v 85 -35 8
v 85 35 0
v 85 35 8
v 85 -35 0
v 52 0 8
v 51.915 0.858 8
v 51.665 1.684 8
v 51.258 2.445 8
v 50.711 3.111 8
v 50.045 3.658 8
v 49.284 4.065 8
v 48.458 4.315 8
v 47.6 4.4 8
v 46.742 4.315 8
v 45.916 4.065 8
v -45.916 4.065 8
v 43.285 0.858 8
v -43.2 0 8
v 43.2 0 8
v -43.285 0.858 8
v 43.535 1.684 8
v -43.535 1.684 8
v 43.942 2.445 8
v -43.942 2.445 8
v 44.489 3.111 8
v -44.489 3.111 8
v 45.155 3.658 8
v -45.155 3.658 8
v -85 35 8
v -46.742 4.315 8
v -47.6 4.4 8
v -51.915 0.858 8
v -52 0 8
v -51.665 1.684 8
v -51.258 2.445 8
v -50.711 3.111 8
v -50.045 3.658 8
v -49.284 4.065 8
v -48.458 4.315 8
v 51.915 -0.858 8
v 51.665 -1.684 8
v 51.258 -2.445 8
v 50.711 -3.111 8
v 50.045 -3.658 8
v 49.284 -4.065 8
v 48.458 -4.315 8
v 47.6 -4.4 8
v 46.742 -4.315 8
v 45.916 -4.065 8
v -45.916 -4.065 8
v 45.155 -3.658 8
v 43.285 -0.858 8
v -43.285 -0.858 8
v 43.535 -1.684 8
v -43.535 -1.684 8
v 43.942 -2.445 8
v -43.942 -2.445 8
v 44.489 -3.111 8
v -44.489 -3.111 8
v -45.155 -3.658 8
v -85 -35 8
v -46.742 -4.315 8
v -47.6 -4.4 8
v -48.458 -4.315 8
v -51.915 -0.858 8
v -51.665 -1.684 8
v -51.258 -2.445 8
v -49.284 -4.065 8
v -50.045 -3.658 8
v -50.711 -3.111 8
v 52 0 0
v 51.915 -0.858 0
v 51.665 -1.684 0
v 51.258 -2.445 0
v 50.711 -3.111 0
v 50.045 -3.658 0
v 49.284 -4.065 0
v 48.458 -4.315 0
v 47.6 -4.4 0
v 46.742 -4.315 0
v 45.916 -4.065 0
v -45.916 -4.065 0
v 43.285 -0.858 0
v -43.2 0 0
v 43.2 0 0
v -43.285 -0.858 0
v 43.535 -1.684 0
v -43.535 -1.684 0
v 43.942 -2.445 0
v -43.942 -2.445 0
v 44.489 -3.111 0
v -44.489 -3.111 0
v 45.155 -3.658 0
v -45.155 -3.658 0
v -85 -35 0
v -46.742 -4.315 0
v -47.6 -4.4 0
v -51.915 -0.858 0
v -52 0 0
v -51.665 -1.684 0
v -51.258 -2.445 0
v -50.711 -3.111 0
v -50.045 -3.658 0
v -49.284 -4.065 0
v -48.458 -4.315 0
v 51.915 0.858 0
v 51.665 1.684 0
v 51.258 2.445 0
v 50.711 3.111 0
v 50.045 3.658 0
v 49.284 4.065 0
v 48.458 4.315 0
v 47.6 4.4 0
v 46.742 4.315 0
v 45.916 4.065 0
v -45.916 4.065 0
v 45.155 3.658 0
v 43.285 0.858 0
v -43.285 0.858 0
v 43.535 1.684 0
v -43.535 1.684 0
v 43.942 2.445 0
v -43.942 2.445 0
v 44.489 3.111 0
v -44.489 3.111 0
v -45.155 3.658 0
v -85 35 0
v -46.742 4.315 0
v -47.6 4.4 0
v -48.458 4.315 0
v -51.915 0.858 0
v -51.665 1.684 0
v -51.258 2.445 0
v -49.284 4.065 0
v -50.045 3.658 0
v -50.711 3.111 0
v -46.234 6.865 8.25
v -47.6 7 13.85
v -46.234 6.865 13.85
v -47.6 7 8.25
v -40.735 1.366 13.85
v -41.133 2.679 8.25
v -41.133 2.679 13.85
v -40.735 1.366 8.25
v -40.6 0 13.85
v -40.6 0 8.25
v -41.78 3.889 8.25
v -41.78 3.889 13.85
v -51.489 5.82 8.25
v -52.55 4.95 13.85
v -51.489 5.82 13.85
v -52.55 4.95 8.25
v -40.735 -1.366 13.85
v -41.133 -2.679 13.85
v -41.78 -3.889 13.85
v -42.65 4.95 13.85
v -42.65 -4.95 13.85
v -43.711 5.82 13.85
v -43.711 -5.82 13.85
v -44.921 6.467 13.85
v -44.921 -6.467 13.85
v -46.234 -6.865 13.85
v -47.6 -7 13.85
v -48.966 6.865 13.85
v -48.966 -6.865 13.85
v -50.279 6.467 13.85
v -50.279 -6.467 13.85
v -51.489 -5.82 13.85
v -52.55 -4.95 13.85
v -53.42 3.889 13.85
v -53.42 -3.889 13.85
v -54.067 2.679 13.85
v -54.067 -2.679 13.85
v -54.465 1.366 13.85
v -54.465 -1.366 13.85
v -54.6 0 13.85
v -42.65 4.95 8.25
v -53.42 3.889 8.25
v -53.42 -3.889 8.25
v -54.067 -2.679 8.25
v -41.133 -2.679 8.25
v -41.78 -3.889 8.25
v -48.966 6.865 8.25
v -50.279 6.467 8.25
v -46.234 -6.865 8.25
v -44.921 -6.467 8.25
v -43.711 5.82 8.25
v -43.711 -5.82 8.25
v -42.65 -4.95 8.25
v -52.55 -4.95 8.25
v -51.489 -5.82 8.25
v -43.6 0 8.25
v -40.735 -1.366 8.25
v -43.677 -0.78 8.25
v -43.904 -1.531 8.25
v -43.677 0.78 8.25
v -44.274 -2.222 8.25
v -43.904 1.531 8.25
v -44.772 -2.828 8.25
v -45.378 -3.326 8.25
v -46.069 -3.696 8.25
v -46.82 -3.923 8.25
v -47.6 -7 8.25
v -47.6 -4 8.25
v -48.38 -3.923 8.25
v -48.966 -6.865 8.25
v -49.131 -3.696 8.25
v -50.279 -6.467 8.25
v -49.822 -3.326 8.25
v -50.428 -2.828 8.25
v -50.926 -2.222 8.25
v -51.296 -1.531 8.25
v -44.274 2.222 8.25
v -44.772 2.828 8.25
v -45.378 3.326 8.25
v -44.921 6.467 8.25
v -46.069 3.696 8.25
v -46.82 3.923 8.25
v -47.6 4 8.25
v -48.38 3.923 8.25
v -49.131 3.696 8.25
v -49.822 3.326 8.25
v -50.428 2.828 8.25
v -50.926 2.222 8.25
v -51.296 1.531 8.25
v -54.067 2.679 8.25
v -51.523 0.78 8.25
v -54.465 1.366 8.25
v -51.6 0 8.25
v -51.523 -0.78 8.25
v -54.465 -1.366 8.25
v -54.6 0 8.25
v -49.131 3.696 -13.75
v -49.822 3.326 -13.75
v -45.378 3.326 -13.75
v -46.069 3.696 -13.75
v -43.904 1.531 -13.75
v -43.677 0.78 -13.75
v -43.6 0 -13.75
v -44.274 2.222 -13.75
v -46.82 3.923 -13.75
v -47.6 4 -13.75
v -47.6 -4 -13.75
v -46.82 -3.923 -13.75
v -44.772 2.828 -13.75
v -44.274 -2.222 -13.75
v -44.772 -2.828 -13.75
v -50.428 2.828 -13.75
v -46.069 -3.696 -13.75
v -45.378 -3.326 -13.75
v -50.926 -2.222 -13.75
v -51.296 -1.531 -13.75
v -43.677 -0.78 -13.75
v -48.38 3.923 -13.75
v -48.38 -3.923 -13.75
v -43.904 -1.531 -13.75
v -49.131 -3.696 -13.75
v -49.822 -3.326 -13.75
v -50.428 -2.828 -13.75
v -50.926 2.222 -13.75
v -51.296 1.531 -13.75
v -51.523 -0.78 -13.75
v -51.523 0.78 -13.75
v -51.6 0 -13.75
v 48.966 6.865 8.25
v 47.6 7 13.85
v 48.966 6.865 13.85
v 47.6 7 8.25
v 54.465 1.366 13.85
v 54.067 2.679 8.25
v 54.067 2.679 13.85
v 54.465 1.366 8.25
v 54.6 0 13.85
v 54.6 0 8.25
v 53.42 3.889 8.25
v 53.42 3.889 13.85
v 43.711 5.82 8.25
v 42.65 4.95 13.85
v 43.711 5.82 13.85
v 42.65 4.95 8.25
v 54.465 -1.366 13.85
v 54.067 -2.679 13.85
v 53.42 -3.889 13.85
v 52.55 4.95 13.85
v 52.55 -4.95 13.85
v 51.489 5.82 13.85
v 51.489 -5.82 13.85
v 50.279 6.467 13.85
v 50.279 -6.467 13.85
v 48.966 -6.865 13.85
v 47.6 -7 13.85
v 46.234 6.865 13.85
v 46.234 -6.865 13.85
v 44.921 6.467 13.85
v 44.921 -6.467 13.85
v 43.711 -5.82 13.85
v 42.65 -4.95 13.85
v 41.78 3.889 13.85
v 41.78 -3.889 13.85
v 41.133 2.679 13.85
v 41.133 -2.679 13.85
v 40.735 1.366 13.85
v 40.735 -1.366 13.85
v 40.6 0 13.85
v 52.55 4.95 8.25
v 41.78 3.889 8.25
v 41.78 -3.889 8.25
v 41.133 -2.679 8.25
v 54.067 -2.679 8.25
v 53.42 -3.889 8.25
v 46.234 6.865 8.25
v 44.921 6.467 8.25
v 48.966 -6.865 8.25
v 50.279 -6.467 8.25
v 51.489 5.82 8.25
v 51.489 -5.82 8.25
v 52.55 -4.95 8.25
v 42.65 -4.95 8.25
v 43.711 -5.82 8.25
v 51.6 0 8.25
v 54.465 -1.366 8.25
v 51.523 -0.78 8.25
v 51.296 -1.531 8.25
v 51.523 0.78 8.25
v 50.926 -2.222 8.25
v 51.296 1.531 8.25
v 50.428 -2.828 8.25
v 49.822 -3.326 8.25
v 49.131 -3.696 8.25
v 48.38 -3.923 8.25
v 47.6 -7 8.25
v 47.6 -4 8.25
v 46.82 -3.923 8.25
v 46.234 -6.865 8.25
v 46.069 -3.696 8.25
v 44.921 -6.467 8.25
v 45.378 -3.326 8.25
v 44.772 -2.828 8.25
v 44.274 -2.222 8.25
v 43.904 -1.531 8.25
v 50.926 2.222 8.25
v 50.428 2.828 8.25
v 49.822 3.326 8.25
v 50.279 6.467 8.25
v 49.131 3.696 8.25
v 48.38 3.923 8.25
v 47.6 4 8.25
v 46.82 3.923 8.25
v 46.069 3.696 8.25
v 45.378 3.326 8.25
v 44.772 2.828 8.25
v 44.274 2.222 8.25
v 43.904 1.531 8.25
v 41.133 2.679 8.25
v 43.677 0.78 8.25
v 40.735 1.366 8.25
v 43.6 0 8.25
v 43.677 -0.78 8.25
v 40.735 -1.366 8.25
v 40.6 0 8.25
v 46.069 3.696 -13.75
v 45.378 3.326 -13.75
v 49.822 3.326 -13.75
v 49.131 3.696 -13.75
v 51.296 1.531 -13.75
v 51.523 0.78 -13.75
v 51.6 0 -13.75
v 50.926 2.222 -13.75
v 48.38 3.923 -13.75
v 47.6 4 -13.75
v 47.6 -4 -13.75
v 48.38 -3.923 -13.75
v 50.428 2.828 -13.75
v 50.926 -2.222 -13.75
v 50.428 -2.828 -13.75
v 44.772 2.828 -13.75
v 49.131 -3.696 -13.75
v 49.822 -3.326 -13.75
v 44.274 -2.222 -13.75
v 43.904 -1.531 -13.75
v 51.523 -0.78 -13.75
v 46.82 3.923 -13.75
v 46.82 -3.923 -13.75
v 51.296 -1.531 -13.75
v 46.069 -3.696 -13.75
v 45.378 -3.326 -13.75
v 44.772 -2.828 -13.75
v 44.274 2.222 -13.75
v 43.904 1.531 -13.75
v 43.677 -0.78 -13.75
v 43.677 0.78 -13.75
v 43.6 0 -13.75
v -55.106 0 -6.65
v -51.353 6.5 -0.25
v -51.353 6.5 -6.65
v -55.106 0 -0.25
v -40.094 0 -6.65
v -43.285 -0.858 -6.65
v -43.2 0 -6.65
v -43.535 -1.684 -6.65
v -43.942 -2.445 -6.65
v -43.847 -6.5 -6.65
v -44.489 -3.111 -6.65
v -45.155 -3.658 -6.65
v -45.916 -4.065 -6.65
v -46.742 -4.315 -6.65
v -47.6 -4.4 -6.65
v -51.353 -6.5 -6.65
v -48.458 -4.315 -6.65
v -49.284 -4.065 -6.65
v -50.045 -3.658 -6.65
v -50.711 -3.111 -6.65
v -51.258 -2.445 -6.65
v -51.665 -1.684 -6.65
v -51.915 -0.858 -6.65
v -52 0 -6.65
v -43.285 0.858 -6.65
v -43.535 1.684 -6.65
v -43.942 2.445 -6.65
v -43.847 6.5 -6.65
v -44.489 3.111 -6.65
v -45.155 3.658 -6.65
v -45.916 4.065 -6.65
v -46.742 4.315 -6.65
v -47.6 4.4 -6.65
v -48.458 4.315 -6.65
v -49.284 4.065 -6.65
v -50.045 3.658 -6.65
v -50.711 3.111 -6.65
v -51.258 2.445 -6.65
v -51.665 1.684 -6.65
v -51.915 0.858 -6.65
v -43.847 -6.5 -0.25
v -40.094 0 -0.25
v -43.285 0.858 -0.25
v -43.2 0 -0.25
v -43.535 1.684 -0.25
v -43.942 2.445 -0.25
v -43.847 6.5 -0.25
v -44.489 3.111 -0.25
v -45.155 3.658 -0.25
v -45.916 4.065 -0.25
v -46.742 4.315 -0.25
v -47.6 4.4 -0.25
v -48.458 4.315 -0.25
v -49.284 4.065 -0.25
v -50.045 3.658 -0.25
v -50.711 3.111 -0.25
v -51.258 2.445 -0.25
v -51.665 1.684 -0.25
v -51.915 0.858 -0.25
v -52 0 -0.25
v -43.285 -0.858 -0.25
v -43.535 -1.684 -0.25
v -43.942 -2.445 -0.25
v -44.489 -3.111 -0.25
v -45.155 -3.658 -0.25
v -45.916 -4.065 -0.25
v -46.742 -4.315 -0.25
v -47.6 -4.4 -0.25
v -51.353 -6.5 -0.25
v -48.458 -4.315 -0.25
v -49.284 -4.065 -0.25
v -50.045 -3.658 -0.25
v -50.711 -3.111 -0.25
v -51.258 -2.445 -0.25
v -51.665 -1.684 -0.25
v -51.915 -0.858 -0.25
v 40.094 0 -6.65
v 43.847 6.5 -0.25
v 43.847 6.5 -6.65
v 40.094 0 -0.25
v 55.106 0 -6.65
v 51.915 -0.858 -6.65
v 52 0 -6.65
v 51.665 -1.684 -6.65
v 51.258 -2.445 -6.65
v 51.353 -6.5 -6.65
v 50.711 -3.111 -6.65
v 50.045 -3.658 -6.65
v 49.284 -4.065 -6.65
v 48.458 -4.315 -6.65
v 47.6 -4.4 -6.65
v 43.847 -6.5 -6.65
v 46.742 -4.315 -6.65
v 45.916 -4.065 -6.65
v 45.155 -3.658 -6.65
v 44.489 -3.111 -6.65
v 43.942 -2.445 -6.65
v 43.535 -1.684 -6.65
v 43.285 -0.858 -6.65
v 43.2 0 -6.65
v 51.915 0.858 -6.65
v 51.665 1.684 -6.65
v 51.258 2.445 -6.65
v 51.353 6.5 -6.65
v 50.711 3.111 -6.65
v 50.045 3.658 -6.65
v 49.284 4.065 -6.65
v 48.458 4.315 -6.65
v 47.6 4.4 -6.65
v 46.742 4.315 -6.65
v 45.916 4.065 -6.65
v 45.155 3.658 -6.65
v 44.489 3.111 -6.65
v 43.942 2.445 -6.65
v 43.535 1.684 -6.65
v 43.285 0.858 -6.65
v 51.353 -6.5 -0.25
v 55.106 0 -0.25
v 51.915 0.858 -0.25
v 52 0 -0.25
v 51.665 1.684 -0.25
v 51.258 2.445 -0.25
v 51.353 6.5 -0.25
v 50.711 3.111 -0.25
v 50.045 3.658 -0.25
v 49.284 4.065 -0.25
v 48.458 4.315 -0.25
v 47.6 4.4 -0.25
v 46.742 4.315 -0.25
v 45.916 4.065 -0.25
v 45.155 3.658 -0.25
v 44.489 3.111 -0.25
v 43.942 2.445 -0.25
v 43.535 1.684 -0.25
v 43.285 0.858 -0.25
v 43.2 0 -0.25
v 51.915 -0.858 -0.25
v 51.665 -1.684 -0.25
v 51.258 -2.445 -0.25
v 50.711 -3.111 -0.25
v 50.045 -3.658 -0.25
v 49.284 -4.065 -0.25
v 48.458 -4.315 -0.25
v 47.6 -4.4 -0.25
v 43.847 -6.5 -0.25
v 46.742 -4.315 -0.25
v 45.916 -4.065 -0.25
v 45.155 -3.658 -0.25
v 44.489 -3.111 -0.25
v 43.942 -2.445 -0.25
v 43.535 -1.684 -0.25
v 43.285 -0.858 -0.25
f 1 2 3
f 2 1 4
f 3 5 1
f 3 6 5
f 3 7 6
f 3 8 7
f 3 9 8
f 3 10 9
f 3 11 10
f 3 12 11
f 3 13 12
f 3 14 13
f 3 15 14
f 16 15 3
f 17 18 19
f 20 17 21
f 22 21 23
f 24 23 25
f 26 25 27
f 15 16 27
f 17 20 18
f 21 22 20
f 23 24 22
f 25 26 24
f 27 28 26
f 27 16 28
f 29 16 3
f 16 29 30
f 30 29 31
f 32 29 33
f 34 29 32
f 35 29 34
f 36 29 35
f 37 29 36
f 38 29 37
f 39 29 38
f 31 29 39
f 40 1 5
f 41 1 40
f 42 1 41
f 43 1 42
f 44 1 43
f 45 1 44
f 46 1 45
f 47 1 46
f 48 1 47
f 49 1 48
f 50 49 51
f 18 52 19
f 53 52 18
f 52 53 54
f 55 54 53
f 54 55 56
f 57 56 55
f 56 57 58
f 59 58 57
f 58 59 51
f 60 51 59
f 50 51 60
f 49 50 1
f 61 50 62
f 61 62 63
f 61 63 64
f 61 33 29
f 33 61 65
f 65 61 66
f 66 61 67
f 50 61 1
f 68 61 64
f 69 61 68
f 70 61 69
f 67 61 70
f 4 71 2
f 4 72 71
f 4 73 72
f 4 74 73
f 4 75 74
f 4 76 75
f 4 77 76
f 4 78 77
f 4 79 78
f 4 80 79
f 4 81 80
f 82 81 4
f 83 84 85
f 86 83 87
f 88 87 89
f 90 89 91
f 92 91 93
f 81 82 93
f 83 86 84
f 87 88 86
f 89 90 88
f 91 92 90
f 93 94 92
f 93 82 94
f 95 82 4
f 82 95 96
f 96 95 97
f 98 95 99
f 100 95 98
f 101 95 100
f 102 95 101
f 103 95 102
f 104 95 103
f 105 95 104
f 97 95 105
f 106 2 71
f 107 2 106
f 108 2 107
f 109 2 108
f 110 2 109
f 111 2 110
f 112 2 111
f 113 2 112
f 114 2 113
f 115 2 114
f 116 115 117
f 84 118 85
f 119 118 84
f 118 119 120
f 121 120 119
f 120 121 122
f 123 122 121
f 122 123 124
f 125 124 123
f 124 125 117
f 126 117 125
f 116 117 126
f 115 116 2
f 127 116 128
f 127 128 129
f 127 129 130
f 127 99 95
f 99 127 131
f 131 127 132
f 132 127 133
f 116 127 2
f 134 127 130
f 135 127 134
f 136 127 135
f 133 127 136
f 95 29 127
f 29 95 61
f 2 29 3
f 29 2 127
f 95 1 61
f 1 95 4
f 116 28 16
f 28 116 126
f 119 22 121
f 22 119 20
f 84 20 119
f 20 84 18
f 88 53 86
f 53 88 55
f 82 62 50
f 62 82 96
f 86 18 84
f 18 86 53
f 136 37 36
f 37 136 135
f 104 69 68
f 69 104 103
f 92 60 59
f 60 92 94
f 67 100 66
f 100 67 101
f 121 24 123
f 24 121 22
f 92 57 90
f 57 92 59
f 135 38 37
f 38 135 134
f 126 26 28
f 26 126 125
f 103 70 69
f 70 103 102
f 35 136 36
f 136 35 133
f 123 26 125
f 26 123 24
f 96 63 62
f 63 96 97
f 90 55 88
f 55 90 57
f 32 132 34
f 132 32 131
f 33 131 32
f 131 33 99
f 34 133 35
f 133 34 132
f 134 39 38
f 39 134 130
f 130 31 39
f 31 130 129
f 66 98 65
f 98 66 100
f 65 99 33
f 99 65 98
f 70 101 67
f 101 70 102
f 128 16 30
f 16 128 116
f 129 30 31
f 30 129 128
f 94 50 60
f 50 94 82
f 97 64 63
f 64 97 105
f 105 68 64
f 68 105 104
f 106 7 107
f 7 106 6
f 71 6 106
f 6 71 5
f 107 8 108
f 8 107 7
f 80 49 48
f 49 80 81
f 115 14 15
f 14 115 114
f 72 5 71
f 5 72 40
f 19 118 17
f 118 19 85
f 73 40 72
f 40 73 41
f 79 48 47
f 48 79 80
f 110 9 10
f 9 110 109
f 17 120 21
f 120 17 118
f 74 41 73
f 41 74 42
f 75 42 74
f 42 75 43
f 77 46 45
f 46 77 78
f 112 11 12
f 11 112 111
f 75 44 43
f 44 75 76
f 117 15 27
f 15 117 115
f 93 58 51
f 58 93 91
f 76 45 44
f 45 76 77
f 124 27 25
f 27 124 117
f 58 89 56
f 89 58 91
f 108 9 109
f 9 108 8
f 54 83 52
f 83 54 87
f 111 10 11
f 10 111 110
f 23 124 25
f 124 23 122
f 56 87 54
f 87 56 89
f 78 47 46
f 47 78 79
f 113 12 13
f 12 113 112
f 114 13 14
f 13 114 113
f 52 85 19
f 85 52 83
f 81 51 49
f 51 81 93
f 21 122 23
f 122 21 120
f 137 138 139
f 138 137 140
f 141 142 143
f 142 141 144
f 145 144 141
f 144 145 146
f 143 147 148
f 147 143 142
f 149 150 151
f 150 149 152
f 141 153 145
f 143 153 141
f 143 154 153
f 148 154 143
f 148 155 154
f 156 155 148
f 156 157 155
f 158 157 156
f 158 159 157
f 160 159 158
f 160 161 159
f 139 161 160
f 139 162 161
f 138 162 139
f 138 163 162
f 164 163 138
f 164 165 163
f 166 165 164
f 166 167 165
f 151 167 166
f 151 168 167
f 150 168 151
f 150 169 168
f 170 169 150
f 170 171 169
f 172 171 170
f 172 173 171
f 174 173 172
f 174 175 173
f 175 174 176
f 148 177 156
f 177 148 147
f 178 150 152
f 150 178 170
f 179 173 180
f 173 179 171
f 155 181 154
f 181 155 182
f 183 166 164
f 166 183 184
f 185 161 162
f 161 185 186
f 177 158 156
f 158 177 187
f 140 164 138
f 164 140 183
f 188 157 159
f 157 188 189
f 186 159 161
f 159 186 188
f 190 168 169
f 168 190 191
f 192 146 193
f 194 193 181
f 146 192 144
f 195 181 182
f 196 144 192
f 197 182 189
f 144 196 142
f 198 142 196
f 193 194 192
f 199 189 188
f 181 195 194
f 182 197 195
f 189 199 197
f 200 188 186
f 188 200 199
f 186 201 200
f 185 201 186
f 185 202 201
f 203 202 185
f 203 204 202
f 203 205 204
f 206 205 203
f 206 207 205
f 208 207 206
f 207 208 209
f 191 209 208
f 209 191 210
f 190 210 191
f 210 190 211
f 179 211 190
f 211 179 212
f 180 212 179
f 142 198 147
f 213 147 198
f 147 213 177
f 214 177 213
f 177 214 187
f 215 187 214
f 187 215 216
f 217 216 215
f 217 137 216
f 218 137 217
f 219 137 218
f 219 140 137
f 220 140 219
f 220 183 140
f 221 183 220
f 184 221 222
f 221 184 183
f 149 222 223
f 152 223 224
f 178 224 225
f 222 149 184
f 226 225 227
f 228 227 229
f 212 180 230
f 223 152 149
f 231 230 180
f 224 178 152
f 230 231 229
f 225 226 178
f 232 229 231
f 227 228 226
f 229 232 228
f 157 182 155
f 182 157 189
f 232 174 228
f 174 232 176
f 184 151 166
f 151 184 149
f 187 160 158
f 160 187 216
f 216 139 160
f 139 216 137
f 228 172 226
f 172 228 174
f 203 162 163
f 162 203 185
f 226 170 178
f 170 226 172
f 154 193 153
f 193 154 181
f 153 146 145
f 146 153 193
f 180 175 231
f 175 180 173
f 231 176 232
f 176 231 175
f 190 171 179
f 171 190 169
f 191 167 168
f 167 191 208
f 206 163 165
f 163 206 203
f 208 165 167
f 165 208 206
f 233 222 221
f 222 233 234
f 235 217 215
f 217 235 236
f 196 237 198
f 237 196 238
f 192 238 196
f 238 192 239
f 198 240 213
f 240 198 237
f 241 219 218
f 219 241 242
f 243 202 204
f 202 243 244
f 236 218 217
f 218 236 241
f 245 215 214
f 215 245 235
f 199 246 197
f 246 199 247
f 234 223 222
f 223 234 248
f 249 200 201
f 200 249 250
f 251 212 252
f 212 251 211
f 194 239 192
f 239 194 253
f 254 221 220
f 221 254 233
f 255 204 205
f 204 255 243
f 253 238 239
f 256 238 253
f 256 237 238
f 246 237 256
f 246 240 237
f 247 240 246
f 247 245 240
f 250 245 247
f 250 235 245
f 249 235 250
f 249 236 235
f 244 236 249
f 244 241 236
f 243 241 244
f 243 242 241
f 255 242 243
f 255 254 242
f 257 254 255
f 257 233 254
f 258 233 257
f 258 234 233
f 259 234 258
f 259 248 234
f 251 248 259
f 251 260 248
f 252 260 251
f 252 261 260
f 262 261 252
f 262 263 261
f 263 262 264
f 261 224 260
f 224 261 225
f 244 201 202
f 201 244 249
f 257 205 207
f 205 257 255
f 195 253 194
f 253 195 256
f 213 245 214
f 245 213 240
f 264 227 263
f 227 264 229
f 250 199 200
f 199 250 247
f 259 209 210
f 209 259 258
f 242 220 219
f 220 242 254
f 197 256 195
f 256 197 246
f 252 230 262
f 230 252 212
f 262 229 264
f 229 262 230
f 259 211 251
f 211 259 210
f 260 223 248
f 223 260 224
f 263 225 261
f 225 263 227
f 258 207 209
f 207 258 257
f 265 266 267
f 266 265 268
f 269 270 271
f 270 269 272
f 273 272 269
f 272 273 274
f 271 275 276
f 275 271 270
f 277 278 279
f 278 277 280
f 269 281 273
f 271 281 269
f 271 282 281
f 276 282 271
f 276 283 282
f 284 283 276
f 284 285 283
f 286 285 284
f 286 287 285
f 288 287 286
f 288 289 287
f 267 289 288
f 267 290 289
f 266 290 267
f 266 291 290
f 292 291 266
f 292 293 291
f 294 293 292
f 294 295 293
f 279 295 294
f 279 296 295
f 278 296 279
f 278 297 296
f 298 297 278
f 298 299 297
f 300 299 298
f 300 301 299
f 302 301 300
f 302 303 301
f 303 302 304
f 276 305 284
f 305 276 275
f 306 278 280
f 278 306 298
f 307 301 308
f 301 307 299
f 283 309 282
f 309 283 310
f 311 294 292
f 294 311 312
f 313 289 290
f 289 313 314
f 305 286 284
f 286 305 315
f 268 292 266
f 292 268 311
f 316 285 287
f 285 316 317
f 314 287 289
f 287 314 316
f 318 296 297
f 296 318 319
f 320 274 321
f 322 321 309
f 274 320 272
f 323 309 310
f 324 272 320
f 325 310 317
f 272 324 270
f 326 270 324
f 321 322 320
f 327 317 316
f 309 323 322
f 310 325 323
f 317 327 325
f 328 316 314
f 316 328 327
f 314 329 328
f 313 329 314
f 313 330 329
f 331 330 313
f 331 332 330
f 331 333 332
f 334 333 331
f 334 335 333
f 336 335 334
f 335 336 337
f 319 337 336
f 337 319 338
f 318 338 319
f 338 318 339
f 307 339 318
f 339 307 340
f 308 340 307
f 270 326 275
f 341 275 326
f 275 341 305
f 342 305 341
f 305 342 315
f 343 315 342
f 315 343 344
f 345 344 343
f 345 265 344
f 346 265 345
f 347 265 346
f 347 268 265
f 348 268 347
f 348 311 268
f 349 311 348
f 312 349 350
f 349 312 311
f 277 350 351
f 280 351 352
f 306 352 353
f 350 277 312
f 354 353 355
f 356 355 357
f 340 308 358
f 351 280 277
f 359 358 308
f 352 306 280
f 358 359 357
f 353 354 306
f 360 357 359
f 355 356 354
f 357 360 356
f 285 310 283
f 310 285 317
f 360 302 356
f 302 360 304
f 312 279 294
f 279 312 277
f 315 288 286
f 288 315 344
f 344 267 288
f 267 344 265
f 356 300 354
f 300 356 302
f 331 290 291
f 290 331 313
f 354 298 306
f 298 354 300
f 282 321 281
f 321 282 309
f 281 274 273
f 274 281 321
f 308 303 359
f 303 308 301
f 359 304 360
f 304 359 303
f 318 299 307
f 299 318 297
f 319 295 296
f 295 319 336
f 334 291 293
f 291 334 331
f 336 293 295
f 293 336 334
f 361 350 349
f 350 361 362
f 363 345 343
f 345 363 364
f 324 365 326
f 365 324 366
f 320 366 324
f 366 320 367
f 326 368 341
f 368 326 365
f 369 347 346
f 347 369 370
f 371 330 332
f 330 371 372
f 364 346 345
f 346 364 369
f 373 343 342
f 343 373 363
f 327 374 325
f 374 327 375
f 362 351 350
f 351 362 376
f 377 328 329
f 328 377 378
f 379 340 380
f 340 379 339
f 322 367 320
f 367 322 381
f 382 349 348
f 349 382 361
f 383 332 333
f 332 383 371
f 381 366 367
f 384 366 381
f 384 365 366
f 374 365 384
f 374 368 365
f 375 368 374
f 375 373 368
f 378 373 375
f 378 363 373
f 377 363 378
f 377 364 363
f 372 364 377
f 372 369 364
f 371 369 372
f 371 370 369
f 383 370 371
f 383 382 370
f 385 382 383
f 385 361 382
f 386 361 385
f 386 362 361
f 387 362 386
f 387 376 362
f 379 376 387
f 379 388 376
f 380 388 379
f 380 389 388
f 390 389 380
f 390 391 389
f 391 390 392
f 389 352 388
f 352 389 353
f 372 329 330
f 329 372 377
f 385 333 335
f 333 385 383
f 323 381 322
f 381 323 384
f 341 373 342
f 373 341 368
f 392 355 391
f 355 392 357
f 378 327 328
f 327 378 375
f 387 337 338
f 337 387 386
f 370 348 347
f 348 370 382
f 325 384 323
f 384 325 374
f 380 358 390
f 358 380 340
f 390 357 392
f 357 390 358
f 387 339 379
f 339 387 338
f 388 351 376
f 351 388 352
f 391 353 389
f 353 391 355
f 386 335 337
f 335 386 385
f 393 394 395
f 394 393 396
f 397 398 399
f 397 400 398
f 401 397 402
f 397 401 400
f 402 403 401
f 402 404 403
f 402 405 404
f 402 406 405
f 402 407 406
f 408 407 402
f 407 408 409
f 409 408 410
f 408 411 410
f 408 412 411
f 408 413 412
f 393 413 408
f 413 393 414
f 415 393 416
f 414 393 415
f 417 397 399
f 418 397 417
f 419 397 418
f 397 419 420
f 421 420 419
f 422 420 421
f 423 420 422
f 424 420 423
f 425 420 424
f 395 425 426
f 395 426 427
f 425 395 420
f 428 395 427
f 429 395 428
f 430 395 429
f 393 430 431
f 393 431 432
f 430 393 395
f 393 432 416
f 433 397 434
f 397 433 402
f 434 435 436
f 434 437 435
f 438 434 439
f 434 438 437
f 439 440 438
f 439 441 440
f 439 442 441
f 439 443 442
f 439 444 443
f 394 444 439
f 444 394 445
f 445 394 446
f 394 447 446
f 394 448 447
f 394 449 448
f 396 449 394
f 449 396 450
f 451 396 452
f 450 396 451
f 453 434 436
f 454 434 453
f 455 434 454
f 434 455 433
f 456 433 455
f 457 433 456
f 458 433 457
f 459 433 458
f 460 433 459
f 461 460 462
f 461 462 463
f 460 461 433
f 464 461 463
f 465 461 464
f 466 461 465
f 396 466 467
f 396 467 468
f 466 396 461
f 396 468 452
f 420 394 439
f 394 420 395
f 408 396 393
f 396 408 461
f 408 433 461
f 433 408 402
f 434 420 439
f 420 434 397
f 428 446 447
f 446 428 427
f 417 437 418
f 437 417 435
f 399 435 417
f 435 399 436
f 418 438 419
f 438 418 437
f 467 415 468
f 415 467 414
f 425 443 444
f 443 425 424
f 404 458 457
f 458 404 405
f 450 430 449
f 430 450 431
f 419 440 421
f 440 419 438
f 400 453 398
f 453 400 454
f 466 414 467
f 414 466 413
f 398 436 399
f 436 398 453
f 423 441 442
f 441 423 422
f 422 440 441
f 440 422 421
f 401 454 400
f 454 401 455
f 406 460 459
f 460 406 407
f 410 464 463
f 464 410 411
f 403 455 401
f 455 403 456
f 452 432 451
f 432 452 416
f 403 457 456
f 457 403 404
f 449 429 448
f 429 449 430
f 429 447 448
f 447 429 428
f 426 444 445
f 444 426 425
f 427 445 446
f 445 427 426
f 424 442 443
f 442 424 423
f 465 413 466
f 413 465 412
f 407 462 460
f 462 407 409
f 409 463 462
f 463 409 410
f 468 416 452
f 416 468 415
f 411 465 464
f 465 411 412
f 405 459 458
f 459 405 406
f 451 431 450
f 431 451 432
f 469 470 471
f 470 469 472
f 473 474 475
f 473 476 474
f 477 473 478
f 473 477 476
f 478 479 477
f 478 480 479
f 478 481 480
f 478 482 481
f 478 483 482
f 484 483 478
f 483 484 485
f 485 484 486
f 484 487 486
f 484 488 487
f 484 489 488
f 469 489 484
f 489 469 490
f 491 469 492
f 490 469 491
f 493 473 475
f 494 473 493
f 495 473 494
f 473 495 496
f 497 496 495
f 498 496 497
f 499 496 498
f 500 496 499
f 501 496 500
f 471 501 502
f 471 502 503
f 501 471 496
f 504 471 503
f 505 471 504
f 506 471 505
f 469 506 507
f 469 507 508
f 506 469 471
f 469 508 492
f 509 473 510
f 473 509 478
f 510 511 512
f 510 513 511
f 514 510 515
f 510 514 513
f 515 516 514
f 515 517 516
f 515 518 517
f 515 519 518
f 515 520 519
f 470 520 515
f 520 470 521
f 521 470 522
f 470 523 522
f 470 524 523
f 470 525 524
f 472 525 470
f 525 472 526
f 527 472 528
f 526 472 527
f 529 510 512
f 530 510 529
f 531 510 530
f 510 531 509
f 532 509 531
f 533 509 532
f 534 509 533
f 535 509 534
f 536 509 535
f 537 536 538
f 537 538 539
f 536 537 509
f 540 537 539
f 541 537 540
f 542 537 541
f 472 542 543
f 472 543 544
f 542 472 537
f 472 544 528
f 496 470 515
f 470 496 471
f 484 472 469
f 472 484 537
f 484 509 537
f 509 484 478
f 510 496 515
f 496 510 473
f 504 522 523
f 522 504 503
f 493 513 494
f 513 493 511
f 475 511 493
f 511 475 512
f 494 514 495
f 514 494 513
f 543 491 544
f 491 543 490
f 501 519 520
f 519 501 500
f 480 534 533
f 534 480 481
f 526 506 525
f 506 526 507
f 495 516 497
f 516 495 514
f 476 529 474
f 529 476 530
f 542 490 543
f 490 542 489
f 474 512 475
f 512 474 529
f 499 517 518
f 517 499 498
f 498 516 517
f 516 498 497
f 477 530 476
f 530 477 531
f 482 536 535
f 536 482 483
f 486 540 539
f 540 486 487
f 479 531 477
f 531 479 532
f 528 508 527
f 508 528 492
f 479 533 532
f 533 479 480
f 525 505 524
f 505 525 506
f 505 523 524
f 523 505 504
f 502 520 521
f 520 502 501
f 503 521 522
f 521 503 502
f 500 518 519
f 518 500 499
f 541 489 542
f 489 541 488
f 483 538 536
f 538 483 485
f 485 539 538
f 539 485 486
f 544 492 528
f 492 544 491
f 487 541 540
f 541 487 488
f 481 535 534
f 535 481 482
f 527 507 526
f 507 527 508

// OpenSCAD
$fn = 32;

// ------------------------------------------------------------------------
// Bolted plate: 170 x 70 x 8 mm plate, 2 fasteners
// Every part is its own module, assembly() places them once.
// ------------------------------------------------------------------------

// --- part 1 ---
module plate() {
  difference() {
    translate([-85, -35, 0]) cube([170, 70, 8]);
    translate([-47.6, 0, -1]) cylinder(h = 10, d = 8.8);
    translate([47.6, 0, -1]) cylinder(h = 10, d = 8.8);
  }
}

// --- part 2 ---
module bolt1() {
  cylinder(h = 5.6, d = 14);
  translate([0, 0, -22]) cylinder(h = 22, d = 8);
}

// --- part 3 ---
module bolt2() {
  cylinder(h = 5.6, d = 14);
  translate([0, 0, -22]) cylinder(h = 22, d = 8);
}

// --- part 4 ---
module nut1() {
  difference() {
    linear_extrude(height = 6.4) polygon(points = [[7.506, 0], [3.753, 6.5], [-3.753, 6.5], [-7.506, 0], [-3.753, -6.5], [3.753, -6.5]]);
    translate([0, 0, -1]) cylinder(h = 8.4, d = 8.8);
  }
}

// --- part 5 ---
module nut2() {
  difference() {
    linear_extrude(height = 6.4) polygon(points = [[7.506, 0], [3.753, 6.5], [-3.753, 6.5], [-7.506, 0], [-3.753, -6.5], [3.753, -6.5]]);
    translate([0, 0, -1]) cylinder(h = 8.4, d = 8.8);
  }
}

// --- assembly ---
module assembly() {
  translate([0, 0, 0]) rotate([0, 0, 0]) plate();
  translate([-47.6, 0, 8.25]) rotate([0, 0, 0]) bolt1();
  translate([47.6, 0, 8.25]) rotate([0, 0, 0]) bolt2();
  translate([-47.6, 0, -6.65]) rotate([0, 0, 0]) nut1();
  translate([47.6, 0, -6.65]) rotate([0, 0, 0]) nut2();
}

assembly();
